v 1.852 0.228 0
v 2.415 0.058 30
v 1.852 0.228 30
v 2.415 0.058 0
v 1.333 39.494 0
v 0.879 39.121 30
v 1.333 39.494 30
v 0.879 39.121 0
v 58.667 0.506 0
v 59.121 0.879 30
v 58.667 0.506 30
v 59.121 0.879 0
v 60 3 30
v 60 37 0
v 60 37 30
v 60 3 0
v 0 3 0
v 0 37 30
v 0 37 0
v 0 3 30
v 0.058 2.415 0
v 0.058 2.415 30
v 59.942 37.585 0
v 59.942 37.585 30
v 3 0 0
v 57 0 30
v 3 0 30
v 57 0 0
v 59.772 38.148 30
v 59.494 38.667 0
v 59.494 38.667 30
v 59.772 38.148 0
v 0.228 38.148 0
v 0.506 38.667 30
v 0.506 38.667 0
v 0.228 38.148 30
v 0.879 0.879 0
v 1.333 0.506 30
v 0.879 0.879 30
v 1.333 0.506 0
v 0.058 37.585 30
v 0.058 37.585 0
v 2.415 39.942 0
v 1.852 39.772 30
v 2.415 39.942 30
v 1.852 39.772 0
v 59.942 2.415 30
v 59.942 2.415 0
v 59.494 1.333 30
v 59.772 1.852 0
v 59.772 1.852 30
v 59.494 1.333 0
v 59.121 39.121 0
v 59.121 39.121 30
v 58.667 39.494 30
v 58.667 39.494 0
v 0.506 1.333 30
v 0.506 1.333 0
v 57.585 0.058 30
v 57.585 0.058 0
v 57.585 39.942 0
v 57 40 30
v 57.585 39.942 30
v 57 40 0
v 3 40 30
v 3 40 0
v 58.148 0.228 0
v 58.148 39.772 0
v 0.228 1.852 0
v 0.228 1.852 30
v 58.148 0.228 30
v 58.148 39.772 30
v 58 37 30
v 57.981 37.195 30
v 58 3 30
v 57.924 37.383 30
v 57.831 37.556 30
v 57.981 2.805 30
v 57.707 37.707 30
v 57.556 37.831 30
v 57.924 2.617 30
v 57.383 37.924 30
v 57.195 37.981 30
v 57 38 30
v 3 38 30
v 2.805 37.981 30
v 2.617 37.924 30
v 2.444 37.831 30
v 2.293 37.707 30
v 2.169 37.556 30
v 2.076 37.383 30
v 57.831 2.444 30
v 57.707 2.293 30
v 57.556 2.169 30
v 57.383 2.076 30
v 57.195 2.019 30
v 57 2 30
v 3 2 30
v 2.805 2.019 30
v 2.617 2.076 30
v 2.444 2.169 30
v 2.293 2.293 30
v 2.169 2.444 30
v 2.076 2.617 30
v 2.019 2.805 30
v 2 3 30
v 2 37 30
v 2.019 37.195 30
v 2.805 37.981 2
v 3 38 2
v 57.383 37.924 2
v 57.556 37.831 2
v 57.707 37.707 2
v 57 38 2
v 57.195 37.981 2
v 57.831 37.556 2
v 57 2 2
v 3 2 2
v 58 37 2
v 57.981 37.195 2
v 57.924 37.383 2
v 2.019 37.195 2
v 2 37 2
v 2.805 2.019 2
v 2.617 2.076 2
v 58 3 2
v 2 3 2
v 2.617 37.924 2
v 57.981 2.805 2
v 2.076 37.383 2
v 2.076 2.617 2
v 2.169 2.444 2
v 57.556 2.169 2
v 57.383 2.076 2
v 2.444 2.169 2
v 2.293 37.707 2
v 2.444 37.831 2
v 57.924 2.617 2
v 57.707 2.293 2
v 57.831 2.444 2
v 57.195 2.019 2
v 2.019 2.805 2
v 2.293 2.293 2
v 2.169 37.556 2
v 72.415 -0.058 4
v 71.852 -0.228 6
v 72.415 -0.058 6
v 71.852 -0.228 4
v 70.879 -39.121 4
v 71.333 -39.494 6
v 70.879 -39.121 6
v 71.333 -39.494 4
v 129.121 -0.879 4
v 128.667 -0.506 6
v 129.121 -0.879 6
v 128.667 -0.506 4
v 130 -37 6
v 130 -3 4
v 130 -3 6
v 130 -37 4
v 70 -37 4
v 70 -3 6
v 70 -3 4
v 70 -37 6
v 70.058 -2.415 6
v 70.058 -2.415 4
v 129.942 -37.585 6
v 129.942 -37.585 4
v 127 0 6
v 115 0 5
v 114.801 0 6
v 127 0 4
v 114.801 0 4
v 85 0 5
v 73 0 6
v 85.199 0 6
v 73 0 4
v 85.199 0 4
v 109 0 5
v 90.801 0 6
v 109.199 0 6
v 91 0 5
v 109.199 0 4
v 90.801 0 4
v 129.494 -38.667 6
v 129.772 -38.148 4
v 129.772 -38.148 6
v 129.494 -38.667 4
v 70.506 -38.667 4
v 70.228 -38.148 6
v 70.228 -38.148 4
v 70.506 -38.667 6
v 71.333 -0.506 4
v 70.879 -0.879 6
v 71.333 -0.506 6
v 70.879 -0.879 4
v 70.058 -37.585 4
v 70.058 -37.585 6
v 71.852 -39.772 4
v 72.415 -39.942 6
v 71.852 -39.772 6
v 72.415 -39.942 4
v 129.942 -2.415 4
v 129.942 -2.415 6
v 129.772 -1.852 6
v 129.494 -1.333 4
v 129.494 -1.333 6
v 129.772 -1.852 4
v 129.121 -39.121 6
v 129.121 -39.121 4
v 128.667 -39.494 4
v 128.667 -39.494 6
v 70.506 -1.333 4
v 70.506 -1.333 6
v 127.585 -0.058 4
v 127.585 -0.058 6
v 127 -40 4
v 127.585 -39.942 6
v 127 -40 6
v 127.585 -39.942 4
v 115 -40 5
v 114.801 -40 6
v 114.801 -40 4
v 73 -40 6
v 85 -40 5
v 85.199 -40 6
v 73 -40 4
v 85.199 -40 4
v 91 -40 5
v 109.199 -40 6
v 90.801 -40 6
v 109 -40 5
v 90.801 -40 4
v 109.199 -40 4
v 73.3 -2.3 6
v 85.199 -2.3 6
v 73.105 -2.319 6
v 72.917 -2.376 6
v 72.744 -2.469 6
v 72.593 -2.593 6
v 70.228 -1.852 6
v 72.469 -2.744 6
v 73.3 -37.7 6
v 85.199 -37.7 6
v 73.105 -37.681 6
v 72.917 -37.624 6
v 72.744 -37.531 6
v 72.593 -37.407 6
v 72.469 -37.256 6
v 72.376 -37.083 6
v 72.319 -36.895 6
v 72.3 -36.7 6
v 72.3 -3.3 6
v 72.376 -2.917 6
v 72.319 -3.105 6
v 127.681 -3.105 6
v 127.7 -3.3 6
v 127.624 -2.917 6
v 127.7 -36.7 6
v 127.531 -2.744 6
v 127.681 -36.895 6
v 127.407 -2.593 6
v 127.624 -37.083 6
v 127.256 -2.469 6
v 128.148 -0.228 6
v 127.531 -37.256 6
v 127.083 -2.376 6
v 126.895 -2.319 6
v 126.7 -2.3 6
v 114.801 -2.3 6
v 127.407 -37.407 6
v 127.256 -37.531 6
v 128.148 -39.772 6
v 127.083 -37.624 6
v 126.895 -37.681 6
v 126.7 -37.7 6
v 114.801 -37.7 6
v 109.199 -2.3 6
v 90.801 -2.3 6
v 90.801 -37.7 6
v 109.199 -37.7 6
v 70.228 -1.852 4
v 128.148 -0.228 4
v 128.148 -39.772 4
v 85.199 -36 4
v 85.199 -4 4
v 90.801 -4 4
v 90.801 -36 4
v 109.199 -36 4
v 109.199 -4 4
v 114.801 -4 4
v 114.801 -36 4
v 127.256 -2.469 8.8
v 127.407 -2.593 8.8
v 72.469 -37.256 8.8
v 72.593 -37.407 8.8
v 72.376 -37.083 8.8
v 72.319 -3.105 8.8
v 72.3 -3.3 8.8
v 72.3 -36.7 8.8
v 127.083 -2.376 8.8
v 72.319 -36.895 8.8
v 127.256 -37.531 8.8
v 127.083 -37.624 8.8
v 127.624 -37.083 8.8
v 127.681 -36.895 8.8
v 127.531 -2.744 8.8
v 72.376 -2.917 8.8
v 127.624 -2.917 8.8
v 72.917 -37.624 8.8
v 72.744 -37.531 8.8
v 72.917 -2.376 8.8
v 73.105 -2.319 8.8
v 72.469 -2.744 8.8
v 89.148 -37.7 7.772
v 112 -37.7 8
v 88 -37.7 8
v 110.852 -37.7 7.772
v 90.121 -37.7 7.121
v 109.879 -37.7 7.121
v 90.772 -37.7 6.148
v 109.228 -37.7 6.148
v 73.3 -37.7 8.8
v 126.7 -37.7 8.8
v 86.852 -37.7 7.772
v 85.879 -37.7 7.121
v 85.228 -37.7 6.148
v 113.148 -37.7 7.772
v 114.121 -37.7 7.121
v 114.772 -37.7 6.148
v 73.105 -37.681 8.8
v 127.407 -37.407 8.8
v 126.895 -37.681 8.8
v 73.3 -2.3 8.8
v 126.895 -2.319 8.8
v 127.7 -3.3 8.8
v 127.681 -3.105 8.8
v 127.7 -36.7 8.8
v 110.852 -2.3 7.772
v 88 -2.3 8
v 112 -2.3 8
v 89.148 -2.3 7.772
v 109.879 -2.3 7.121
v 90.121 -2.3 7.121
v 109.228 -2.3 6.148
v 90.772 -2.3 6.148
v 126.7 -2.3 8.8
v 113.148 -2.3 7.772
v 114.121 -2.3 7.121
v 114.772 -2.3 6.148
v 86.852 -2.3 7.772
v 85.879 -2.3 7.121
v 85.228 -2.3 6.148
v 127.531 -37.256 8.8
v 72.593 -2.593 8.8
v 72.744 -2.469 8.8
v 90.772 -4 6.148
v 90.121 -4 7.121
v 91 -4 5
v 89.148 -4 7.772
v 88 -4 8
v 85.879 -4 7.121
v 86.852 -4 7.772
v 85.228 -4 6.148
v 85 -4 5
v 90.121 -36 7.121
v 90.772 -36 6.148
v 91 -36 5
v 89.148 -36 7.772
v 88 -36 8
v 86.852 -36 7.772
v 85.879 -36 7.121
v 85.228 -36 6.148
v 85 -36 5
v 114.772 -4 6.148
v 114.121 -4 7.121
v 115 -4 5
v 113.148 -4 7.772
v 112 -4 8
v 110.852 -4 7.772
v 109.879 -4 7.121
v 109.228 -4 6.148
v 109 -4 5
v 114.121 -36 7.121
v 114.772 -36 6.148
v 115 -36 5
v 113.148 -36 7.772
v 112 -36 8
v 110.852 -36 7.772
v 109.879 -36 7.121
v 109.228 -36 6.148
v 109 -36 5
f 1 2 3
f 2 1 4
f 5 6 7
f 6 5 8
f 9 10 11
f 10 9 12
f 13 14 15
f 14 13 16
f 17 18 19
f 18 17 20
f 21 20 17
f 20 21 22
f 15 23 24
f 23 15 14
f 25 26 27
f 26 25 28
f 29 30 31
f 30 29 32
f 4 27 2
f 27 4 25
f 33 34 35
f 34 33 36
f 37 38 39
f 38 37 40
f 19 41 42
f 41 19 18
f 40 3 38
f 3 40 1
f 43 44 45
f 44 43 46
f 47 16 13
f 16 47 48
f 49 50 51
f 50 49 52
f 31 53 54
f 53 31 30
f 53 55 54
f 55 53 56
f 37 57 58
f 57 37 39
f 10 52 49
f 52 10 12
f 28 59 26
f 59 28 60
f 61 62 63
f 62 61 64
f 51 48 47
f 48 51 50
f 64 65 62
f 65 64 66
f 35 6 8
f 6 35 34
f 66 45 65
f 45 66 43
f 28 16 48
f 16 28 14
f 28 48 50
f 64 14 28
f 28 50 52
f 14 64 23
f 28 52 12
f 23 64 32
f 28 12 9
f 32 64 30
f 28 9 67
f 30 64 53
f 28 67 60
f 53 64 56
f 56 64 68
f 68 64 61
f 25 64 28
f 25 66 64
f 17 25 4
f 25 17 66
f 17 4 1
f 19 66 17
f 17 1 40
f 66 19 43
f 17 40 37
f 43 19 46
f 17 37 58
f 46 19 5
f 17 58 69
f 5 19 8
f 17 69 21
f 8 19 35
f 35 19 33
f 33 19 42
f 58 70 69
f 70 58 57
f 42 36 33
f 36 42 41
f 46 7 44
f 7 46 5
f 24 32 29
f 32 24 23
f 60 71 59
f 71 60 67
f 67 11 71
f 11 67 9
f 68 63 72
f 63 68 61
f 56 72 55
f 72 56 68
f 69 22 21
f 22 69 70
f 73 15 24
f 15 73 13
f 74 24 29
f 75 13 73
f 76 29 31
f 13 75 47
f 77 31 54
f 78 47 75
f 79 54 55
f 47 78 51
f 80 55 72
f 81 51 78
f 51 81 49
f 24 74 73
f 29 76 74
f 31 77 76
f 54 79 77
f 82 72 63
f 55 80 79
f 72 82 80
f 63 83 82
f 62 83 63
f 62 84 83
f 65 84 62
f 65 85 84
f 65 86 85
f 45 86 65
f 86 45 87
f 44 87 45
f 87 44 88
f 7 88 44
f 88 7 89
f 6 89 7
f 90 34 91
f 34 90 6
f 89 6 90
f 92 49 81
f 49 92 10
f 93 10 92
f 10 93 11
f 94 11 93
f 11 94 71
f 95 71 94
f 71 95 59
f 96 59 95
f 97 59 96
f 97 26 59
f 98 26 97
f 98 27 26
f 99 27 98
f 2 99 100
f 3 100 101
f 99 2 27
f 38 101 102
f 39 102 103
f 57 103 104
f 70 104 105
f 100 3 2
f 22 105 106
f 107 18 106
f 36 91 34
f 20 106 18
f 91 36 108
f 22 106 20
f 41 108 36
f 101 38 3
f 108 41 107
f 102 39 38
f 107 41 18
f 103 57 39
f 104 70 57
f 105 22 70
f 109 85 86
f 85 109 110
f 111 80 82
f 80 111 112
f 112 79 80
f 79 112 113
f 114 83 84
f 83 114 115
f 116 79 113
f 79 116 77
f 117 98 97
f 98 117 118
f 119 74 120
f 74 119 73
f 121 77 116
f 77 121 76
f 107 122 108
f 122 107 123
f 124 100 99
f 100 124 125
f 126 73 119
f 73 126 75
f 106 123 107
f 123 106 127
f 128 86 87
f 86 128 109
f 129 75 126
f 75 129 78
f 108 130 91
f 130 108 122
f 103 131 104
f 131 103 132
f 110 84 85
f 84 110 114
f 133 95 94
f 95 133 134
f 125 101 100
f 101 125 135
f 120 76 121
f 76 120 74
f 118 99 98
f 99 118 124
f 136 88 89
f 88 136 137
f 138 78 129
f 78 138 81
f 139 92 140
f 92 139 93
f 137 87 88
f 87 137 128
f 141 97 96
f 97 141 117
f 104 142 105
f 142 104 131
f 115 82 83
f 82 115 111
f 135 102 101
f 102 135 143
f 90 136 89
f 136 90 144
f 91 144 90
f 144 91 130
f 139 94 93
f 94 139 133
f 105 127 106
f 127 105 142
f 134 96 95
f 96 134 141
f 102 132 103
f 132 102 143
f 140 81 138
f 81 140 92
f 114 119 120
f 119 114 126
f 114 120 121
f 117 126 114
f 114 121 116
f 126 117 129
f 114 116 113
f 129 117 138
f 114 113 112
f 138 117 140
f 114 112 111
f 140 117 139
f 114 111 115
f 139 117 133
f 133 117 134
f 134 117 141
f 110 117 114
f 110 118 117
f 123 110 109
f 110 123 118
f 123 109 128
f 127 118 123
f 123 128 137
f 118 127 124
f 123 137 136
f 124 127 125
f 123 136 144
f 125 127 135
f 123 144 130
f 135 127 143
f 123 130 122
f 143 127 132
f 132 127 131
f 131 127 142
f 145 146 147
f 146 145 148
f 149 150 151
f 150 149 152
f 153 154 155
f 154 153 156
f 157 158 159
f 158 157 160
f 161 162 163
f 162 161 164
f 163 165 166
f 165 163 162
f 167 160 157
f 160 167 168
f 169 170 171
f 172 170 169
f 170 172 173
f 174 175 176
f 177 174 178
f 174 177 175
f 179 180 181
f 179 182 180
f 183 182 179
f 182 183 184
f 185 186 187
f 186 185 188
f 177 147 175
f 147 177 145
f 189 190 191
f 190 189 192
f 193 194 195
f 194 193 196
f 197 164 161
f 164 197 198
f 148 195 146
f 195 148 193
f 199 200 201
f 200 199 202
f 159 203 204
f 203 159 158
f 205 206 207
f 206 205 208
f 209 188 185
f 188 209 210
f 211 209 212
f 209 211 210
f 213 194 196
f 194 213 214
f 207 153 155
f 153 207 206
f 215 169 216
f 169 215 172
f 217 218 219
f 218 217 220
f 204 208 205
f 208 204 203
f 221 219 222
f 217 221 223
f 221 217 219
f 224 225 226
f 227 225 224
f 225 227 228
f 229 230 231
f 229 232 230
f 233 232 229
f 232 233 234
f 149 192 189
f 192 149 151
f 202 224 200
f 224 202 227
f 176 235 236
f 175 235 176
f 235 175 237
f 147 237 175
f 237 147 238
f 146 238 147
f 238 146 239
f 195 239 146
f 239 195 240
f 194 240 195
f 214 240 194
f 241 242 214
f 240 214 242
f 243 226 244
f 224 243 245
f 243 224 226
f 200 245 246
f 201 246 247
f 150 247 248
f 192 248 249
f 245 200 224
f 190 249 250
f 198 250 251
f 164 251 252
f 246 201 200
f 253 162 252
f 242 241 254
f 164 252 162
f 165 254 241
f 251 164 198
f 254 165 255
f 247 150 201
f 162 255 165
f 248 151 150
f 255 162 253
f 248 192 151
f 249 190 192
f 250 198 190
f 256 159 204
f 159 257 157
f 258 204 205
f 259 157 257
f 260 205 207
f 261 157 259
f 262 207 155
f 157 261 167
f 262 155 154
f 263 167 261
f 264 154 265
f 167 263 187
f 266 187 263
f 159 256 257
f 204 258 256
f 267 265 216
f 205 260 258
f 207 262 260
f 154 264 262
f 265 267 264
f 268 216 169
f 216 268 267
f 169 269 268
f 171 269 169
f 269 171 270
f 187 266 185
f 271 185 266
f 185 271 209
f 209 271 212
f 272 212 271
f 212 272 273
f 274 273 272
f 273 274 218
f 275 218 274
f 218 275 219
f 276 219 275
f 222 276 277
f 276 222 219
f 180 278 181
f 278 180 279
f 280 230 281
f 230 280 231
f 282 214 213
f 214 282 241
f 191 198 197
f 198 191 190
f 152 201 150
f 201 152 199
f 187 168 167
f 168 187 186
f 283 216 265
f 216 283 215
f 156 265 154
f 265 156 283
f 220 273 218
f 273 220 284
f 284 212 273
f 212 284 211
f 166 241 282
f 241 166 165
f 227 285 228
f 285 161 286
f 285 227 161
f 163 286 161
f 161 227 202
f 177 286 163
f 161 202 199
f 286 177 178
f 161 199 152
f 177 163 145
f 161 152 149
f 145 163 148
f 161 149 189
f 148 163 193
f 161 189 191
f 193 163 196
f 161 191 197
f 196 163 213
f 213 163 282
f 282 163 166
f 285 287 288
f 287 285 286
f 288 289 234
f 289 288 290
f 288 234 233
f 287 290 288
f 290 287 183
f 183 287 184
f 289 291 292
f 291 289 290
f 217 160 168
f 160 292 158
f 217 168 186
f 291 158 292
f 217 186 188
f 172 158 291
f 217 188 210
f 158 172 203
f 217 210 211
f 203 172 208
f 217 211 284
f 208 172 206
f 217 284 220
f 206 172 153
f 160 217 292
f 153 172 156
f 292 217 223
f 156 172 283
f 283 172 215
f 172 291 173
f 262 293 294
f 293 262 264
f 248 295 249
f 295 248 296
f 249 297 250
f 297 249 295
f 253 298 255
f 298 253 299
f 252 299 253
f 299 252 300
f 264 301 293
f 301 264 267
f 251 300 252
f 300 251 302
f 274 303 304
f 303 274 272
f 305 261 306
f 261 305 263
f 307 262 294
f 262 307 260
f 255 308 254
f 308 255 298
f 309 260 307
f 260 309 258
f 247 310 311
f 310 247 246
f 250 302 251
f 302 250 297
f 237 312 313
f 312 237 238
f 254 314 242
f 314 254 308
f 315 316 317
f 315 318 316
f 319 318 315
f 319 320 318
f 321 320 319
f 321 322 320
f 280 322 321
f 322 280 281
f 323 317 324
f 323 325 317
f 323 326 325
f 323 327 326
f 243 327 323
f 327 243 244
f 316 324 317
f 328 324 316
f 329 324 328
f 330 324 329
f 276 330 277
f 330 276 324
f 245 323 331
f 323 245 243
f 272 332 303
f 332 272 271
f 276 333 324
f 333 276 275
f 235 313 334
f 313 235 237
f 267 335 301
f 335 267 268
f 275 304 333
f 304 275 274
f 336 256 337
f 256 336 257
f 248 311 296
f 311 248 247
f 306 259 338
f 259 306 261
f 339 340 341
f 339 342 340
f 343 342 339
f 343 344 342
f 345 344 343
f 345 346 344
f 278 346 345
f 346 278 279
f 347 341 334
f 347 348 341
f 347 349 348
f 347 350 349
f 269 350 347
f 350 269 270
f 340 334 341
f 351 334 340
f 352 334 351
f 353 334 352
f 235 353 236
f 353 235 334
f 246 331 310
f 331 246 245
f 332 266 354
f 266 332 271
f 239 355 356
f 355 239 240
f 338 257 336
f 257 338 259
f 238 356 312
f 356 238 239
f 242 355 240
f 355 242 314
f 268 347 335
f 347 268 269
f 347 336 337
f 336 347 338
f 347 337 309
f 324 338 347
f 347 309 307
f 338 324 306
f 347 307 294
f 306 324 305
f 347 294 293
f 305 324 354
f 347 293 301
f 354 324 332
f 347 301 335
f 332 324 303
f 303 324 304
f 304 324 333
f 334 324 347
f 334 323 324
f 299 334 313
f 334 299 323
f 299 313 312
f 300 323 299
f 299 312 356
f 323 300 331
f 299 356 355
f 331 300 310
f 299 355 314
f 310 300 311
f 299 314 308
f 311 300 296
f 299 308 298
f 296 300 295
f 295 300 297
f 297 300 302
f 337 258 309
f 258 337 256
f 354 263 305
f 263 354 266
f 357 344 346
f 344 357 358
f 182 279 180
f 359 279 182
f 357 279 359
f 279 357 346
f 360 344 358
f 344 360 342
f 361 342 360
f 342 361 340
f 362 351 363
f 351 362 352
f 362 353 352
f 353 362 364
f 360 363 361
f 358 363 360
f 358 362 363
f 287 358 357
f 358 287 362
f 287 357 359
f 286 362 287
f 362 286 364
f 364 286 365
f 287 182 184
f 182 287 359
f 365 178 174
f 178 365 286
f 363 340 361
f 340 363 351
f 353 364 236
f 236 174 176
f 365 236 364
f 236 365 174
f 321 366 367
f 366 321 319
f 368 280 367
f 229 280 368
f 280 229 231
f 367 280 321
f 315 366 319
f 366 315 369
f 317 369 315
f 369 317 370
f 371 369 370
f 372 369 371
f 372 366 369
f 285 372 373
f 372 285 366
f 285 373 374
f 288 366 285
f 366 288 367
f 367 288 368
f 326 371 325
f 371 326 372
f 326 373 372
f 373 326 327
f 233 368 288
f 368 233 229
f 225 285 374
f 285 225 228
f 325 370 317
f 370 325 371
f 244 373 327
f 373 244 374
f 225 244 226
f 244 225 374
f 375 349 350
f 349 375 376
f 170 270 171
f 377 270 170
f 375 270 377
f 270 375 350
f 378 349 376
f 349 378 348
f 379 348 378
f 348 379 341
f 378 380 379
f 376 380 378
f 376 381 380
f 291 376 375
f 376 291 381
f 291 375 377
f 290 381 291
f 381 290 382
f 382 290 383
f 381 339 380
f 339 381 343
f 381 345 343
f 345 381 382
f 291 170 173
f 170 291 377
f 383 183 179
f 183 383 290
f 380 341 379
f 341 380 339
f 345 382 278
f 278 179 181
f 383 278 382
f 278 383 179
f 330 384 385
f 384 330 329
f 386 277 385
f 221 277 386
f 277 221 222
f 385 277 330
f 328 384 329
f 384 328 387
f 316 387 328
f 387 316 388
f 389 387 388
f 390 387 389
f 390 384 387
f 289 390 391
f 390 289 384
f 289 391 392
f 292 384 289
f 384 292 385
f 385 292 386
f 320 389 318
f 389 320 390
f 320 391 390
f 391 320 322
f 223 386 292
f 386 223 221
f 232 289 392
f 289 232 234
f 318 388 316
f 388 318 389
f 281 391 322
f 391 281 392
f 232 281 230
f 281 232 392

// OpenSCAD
// Parametric Box with Lid
// A customizable storage box for 3D printing

// === Box Parameters ===
width = 60;              // [20:200] Width in mm
depth = 40;              // [20:200] Depth in mm
height = 30;             // [10:150] Height in mm
wall_thickness = 2;      // [1:0.5:5] Wall thickness in mm

// === Lid Parameters ===
include_lid = true;      // Include a separate lid
lid_height = 8;          // [5:30] Lid height in mm
lid_tolerance = 0.3;     // [0.1:0.1:0.8] Gap for lid fit

// === Style Options ===
corner_radius = 3;       // [0:10] Corner rounding radius
add_grip = true;         // Add grip indents to lid

// === Internal ===
$fn = 32;                // Smoothness

// Rounded box module
module rounded_box(w, d, h, r) {
    if (r > 0) {
        hull() {
            for (x = [r, w-r]) {
                for (y = [r, d-r]) {
                    translate([x, y, 0])
                        cylinder(h = h, r = r);
                }
            }
        }
    } else {
        cube([w, d, h]);
    }
}

// Main box body
module box_body() {
    difference() {
        rounded_box(width, depth, height, corner_radius);

        // Hollow inside
        translate([wall_thickness, wall_thickness, wall_thickness])
            rounded_box(
                width - 2*wall_thickness,
                depth - 2*wall_thickness,
                height,  // Open top
                max(0, corner_radius - wall_thickness)
            );
    }
}

// Lid
module lid() {
    inner_w = width - 2*wall_thickness - 2*lid_tolerance;
    inner_d = depth - 2*wall_thickness - 2*lid_tolerance;
    lip_height = lid_height * 0.6;

    difference() {
        union() {
            // Top cap
            rounded_box(width, depth, wall_thickness, corner_radius);

            // Inner lip
            translate([wall_thickness + lid_tolerance, wall_thickness + lid_tolerance, -lip_height + wall_thickness])
                rounded_box(inner_w, inner_d, lip_height, max(0, corner_radius - wall_thickness));
        }

        // Grip indents
        if (add_grip) {
            for (x = [width * 0.3, width * 0.7]) {
                translate([x, -1, wall_thickness/2])
                    rotate([-90, 0, 0])
                    cylinder(h = 5, r = 3, $fn = 16);
                translate([x, depth - 4, wall_thickness/2])
                    rotate([-90, 0, 0])
                    cylinder(h = 5, r = 3, $fn = 16);
            }
        }
    }
}

// Render
box_body();

if (include_lid) {
    // Position lid next to box for printing
    translate([width + 10, 0, lid_height - wall_thickness])
        rotate([180, 0, 0])
        lid();
}
